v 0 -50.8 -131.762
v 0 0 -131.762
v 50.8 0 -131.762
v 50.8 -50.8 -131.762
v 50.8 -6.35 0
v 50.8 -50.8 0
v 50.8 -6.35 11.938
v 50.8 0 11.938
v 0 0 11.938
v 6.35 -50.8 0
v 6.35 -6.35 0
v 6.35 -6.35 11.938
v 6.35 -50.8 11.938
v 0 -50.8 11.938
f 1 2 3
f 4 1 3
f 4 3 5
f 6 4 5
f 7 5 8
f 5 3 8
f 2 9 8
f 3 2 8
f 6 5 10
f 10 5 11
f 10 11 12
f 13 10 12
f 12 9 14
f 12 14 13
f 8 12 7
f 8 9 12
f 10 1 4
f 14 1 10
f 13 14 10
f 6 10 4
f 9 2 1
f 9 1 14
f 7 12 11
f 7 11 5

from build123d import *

# Parameters (mm, degrees)
F1_DEPTH = 50.8
F0_W     = 6.35
F0_H     = 11.938
F2_DEPTH = 50.8
F0_W_2   = 44.45
F3_DEPTH = 6.35


with BuildPart() as f1:
    # F0 (on Front) → F1 (new body)
    with BuildSketch(Plane.XZ):
        Polygon((6.35, 0), (0, 0), (0, -131.7625), (50.8, -131.7625), (50.8, 0), align=None)
    extrude(amount=F1_DEPTH)

    # F0 (on Front) → F2 (join, through all)
    with BuildSketch(Plane.XZ):
        with Locations((3.175, 5.969)):
            Rectangle(F0_W, F0_H)
    extrude(amount=F2_DEPTH)

    # F0 (on Front) → F3 (join)
    with BuildSketch(Plane.XZ):
        with Locations((28.575, 5.969)):
            Rectangle(F0_W_2, F0_H)
    extrude(amount=F3_DEPTH)


solid = f1.part
